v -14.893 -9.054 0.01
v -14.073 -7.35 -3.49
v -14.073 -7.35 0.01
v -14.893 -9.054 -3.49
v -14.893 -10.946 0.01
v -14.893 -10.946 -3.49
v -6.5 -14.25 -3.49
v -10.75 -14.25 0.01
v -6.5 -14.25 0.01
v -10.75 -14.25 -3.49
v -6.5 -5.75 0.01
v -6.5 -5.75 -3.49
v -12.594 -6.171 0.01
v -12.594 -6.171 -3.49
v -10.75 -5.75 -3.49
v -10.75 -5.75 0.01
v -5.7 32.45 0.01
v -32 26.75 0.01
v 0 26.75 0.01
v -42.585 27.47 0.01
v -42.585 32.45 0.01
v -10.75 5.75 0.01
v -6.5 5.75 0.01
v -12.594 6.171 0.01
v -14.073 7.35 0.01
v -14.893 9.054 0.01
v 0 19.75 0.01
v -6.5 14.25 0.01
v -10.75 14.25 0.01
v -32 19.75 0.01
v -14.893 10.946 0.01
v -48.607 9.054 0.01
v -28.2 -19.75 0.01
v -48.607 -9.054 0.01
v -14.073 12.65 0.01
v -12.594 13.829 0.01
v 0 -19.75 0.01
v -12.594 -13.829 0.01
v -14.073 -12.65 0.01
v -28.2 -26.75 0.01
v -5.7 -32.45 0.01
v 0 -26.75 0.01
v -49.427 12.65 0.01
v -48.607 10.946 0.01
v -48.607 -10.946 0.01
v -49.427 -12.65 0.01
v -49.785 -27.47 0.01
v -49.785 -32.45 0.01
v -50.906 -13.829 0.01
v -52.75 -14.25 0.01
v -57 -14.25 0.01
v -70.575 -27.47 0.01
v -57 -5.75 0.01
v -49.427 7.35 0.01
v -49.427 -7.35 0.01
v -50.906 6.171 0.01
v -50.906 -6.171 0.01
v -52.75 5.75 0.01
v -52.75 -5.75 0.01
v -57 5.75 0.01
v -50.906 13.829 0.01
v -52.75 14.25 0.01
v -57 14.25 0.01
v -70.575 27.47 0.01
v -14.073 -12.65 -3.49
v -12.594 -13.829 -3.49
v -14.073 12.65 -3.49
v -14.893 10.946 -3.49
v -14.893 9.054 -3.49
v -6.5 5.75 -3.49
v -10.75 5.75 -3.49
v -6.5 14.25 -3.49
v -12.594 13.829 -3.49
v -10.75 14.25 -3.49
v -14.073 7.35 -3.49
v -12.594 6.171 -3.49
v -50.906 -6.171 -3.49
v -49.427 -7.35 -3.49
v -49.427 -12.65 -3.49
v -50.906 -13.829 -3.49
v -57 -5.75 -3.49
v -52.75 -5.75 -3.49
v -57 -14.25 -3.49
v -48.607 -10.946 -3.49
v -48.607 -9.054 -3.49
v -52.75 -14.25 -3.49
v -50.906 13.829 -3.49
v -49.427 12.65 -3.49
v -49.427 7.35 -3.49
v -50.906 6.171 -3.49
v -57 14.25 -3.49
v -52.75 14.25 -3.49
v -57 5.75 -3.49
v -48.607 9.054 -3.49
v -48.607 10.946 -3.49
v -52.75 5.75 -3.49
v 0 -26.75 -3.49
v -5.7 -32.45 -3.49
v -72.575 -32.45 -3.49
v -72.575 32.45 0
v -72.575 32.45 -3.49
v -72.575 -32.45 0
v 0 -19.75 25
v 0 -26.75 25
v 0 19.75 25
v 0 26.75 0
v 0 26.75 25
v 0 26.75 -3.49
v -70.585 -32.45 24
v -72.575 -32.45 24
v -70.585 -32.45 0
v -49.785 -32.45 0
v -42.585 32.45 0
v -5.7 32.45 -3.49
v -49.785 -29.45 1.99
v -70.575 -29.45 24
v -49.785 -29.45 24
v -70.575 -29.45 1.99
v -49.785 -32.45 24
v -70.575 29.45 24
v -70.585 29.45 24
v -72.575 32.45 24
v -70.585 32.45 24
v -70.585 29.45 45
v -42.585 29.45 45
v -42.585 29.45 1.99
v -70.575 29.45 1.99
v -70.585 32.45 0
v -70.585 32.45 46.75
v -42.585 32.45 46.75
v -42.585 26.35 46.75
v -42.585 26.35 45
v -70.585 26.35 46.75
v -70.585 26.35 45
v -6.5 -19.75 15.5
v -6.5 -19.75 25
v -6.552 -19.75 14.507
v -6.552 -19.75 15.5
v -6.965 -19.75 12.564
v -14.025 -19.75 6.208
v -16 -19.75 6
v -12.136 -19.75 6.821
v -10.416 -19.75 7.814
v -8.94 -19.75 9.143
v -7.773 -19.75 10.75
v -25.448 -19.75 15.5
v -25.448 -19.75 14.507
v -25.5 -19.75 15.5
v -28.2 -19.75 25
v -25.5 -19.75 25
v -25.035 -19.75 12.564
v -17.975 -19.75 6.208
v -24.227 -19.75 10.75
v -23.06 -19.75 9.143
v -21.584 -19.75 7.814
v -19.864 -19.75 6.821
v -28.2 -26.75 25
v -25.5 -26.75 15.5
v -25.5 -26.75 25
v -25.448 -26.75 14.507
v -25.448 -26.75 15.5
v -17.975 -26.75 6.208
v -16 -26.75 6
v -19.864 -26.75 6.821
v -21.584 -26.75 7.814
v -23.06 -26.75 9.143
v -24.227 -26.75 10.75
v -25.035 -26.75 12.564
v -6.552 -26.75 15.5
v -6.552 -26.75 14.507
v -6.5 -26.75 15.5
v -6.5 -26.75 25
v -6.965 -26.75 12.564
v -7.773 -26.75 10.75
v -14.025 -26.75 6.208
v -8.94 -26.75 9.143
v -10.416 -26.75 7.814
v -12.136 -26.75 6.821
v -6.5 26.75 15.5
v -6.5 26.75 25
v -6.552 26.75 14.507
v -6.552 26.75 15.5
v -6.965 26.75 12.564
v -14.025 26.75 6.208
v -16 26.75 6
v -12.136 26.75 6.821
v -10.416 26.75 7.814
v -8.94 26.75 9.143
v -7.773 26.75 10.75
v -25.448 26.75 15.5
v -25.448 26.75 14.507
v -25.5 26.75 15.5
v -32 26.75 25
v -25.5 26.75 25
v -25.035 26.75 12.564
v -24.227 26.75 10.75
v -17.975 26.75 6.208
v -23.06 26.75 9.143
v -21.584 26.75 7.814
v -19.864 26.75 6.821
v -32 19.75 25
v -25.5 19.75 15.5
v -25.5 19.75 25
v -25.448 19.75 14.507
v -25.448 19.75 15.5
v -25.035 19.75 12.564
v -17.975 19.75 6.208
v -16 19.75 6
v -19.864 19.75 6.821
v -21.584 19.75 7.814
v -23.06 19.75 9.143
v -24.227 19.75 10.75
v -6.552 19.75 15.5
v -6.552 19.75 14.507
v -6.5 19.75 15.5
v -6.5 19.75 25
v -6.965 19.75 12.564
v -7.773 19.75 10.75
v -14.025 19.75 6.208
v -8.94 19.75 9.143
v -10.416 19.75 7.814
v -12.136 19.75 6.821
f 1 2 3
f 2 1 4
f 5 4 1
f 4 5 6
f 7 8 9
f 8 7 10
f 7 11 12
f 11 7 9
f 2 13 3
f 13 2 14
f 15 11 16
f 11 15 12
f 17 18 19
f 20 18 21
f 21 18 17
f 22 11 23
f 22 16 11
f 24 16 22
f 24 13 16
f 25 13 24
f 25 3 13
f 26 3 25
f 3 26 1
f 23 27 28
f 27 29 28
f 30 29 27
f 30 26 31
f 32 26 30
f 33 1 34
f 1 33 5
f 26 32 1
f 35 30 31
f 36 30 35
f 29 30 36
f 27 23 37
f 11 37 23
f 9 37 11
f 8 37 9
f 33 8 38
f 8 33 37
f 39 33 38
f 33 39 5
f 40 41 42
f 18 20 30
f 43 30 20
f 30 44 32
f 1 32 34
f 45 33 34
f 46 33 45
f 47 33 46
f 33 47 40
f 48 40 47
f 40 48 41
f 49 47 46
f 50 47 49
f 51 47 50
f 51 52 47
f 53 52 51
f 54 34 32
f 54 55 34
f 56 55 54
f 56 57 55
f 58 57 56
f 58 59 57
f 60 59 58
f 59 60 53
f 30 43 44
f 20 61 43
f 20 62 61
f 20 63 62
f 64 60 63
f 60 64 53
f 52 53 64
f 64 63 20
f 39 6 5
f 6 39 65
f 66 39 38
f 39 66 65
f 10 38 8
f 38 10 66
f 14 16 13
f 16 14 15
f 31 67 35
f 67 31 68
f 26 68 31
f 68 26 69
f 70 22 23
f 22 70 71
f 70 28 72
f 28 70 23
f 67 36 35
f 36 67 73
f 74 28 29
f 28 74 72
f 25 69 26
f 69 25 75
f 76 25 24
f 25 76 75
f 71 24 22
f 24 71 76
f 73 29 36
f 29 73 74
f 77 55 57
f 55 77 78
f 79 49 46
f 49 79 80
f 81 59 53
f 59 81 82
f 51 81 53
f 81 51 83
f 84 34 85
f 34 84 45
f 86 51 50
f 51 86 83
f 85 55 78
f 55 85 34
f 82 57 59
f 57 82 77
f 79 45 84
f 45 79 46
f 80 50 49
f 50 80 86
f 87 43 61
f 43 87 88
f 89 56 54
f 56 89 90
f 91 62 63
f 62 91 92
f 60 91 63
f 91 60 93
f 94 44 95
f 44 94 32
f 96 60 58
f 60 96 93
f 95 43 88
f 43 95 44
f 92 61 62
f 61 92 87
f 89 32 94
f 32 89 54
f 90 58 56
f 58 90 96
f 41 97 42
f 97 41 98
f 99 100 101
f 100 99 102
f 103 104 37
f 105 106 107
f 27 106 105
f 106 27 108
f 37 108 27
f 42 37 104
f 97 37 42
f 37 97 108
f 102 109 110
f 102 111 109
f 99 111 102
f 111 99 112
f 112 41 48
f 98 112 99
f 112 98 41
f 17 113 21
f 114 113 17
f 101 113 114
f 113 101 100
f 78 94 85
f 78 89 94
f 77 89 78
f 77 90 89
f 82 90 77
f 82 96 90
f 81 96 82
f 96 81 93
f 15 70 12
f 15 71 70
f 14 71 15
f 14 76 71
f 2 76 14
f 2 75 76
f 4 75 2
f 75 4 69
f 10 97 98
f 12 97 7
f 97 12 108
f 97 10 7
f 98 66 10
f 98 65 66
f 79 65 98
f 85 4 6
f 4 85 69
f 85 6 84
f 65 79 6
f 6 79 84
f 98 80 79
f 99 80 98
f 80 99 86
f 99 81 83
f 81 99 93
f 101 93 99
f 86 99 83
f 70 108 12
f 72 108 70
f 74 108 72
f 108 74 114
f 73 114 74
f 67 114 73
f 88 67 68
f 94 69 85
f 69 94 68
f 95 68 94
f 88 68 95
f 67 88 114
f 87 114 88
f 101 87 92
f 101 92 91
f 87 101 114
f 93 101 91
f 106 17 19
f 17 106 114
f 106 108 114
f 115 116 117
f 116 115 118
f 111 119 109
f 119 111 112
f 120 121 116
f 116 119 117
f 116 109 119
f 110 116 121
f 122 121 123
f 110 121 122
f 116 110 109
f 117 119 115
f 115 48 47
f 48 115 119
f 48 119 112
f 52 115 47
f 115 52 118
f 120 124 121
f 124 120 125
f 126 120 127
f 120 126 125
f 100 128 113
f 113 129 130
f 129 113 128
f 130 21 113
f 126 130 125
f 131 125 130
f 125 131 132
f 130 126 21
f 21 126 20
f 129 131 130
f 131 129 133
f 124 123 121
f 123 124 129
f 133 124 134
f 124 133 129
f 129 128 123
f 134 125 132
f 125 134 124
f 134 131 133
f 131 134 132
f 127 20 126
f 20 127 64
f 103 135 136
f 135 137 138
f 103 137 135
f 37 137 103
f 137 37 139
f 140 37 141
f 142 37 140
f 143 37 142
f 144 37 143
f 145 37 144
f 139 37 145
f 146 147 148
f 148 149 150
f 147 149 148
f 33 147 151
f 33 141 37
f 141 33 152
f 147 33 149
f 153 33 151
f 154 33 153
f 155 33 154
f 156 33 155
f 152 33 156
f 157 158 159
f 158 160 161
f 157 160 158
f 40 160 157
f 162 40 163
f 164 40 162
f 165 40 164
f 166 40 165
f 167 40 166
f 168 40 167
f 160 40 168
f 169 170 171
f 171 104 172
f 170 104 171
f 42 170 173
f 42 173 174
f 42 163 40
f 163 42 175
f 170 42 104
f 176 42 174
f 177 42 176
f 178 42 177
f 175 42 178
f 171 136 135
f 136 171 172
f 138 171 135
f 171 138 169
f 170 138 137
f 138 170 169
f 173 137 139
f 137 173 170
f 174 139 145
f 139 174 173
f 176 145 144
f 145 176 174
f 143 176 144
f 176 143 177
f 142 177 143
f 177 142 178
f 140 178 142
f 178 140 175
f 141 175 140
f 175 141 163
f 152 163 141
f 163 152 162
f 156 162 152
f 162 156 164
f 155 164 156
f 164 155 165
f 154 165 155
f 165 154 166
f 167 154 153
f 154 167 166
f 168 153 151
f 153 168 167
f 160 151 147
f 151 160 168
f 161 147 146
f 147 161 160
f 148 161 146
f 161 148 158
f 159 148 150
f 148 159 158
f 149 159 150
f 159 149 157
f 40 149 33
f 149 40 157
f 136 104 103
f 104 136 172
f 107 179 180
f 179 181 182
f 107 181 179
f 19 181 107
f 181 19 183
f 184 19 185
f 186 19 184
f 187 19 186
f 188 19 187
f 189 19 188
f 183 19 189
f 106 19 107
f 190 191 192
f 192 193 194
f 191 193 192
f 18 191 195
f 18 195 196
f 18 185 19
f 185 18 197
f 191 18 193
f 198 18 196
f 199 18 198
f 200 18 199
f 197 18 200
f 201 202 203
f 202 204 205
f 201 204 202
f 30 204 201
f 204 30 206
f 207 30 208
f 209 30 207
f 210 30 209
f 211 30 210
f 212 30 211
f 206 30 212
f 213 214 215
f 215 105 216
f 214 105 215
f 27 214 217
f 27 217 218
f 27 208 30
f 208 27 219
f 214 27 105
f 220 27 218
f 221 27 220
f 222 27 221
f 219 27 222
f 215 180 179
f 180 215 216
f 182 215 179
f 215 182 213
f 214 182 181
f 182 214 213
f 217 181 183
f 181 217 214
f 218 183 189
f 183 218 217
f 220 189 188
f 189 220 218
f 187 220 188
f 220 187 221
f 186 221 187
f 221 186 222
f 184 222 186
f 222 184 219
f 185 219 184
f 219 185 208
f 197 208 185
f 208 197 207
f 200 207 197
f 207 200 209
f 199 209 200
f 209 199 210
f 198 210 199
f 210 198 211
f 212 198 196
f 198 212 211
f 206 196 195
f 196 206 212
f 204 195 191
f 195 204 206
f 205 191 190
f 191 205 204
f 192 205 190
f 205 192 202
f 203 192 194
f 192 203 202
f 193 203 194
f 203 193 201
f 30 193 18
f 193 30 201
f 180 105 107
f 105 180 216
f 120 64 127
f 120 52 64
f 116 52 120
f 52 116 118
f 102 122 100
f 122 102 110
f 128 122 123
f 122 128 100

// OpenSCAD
// for meshing with remixed penholder
//  http://www.thingiverse.com/thing:1873991
// The penholder should have mounting_bump_thickness = 3.5
// and mounting_bump_diameter = 8

mountingBumpDiameter = 8.5;
mountingBumpPairsCount = 2;
mountingBumpVerticalSpacing = 42;
mountingBumpHorizontalSpacing = 20;
plateThickness = 3.5;

module object() {
upperArmThickness = 3;
lowerArmThickness = 7;
upperArmSpacing = 58.8;
upperArmHorizontalSpacing = 58.9;
upperCatchLength = 3.1;
upperCatchThickness = 1.75;
upperShelfLength = 24;
upperShelfThickness = 2;
lowerArmHorizontalSpacing = 39.5;
upperArmMainLength = 45;
upperArmGusset = 2;

plateWidth = upperArmHorizontalSpacing + 2 * upperArmThickness;

rodDiameter = 8.15;
rodCatchDiameter = 19;
rodInset = 6 + rodCatchDiameter/2;
lowerArmLength = rodInset+rodCatchDiameter/2;
lowerArmHeight = 2*6.5+rodCatchDiameter;
rodTopZ = lowerArmHeight - rodCatchDiameter / 2 + rodDiameter / 2;
rightUpperArmStartFromRod = 16;
leftUpperArmStartFromRod = 23.2;
rightUpperArmHeight = 28;
leftUpperArmHeight = 16.4;

plateHeight = rodTopZ+rightUpperArmStartFromRod+rightUpperArmHeight+upperShelfThickness;
mountingBumpsHeight = lowerArmHeight/2-rodCatchDiameter/2;

nudge = 0.01;

// backplate
difference() {
    translate([nudge,-plateWidth/2,0]) rotate([0,-90,0]) linear_extrude(height=plateThickness) difference() {
       corner = (plateWidth - lowerArmHorizontalSpacing)/2-lowerArmThickness;
       square([plateHeight,plateWidth]);
       polygon(points=[[0,0],[0,corner],[corner,0]]);
       polygon(points=[[0,plateWidth],[0,plateWidth-corner],[corner,plateWidth]]);
    }
    for (z = [0:mountingBumpPairsCount-1]) {
        for (sign = [-1:2:1]) {
        verticalAdjust = z%2 != 0 ? mountingBumpDiameter : 0;
        translate([-plateThickness-nudge,sign*mountingBumpHorizontalSpacing/2,mountingBumpsHeight+z*mountingBumpVerticalSpacing+verticalAdjust])
        rotate([90,180*((z%2)),90])
        linear_extrude(height=2*nudge+plateThickness)
         union() {
            translate([0,mountingBumpDiameter/2,0])
            circle(d=mountingBumpDiameter);
            translate([-mountingBumpDiameter/2,0,0]) square([mountingBumpDiameter,mountingBumpDiameter/2]); 
         } 
     } 

    } 
}


// loop over two sides
for (i=[0:1]) {
    sign = i * 2 - 1;
    left = (i==0);
    // left: i = 0, sign = -1
    // right: i = 1, sign = 1
    upperArmStartZ = rodTopZ + (left ? leftUpperArmStartFromRod : rightUpperArmStartFromRod);
    upperArmHeight = ( left ? leftUpperArmHeight : rightUpperArmHeight );

    shelfAreaHeightAdjust = left ? (rightUpperArmStartFromRod+rightUpperArmHeight)-(leftUpperArmStartFromRod+leftUpperArmHeight) : 0;

    // upper arms
    translate([0,sign*(plateWidth/2-upperArmThickness/2),nudge+upperArmStartZ+upperArmHeight/2]) 
    rotate([-sign*90,0,0]) 
        translate([0,-upperArmHeight/2,-upperArmThickness/2]) 
        union() {
        linear_extrude(height=upperArmThickness) 
            union() {
                if (left) {
                square([upperShelfLength, upperArmHeight+shelfAreaHeightAdjust]);
                }
                else {
                square([upperArmMainLength+upperCatchThickness, upperArmHeight]);
                }
            }
        if (!left) { 
            translate([upperArmMainLength,0,0])
                rotate([-90,0,0])
                linear_extrude(height=upperArmHeight)
                translate([0,-upperArmThickness])
                square([upperCatchThickness,upperCatchLength+upperArmThickness]);
        }
        rotate([-90,0,0])
            linear_extrude(height=upperArmHeight+shelfAreaHeightAdjust)
            polygon(points=[[-nudge,upperArmGusset],[upperArmGusset,-nudge],[-nudge,-nudge]]);
        }
        
        
    // lower arms
    armHeightAdjustment = (i==0) ? (6.5-2.7) : 0;
    translate([0,sign*(lowerArmHorizontalSpacing/2+lowerArmThickness/2),0]) rotate([90,0,0]) translate([0,0,-lowerArmThickness/2]) linear_extrude(height=lowerArmThickness) 
    difference() {
        square([lowerArmLength, lowerArmHeight-armHeightAdjustment]);
        translate([rodInset,lowerArmHeight/2]) union() {
            circle(r=rodCatchDiameter/2);
            translate([rodCatchDiameter/2,0]) square([rodCatchDiameter,rodCatchDiameter],center=true);
        }
    } 
}  

translate([0,-plateWidth/2,rodTopZ+rightUpperArmStartFromRod+rightUpperArmHeight]) linear_extrude(height=upperShelfThickness) square([upperShelfLength,plateWidth]); 

}

//minkowski() {
rotate([0,-90,0])
    object();
//    cube([0.001,0.001,0.001]);
//}
